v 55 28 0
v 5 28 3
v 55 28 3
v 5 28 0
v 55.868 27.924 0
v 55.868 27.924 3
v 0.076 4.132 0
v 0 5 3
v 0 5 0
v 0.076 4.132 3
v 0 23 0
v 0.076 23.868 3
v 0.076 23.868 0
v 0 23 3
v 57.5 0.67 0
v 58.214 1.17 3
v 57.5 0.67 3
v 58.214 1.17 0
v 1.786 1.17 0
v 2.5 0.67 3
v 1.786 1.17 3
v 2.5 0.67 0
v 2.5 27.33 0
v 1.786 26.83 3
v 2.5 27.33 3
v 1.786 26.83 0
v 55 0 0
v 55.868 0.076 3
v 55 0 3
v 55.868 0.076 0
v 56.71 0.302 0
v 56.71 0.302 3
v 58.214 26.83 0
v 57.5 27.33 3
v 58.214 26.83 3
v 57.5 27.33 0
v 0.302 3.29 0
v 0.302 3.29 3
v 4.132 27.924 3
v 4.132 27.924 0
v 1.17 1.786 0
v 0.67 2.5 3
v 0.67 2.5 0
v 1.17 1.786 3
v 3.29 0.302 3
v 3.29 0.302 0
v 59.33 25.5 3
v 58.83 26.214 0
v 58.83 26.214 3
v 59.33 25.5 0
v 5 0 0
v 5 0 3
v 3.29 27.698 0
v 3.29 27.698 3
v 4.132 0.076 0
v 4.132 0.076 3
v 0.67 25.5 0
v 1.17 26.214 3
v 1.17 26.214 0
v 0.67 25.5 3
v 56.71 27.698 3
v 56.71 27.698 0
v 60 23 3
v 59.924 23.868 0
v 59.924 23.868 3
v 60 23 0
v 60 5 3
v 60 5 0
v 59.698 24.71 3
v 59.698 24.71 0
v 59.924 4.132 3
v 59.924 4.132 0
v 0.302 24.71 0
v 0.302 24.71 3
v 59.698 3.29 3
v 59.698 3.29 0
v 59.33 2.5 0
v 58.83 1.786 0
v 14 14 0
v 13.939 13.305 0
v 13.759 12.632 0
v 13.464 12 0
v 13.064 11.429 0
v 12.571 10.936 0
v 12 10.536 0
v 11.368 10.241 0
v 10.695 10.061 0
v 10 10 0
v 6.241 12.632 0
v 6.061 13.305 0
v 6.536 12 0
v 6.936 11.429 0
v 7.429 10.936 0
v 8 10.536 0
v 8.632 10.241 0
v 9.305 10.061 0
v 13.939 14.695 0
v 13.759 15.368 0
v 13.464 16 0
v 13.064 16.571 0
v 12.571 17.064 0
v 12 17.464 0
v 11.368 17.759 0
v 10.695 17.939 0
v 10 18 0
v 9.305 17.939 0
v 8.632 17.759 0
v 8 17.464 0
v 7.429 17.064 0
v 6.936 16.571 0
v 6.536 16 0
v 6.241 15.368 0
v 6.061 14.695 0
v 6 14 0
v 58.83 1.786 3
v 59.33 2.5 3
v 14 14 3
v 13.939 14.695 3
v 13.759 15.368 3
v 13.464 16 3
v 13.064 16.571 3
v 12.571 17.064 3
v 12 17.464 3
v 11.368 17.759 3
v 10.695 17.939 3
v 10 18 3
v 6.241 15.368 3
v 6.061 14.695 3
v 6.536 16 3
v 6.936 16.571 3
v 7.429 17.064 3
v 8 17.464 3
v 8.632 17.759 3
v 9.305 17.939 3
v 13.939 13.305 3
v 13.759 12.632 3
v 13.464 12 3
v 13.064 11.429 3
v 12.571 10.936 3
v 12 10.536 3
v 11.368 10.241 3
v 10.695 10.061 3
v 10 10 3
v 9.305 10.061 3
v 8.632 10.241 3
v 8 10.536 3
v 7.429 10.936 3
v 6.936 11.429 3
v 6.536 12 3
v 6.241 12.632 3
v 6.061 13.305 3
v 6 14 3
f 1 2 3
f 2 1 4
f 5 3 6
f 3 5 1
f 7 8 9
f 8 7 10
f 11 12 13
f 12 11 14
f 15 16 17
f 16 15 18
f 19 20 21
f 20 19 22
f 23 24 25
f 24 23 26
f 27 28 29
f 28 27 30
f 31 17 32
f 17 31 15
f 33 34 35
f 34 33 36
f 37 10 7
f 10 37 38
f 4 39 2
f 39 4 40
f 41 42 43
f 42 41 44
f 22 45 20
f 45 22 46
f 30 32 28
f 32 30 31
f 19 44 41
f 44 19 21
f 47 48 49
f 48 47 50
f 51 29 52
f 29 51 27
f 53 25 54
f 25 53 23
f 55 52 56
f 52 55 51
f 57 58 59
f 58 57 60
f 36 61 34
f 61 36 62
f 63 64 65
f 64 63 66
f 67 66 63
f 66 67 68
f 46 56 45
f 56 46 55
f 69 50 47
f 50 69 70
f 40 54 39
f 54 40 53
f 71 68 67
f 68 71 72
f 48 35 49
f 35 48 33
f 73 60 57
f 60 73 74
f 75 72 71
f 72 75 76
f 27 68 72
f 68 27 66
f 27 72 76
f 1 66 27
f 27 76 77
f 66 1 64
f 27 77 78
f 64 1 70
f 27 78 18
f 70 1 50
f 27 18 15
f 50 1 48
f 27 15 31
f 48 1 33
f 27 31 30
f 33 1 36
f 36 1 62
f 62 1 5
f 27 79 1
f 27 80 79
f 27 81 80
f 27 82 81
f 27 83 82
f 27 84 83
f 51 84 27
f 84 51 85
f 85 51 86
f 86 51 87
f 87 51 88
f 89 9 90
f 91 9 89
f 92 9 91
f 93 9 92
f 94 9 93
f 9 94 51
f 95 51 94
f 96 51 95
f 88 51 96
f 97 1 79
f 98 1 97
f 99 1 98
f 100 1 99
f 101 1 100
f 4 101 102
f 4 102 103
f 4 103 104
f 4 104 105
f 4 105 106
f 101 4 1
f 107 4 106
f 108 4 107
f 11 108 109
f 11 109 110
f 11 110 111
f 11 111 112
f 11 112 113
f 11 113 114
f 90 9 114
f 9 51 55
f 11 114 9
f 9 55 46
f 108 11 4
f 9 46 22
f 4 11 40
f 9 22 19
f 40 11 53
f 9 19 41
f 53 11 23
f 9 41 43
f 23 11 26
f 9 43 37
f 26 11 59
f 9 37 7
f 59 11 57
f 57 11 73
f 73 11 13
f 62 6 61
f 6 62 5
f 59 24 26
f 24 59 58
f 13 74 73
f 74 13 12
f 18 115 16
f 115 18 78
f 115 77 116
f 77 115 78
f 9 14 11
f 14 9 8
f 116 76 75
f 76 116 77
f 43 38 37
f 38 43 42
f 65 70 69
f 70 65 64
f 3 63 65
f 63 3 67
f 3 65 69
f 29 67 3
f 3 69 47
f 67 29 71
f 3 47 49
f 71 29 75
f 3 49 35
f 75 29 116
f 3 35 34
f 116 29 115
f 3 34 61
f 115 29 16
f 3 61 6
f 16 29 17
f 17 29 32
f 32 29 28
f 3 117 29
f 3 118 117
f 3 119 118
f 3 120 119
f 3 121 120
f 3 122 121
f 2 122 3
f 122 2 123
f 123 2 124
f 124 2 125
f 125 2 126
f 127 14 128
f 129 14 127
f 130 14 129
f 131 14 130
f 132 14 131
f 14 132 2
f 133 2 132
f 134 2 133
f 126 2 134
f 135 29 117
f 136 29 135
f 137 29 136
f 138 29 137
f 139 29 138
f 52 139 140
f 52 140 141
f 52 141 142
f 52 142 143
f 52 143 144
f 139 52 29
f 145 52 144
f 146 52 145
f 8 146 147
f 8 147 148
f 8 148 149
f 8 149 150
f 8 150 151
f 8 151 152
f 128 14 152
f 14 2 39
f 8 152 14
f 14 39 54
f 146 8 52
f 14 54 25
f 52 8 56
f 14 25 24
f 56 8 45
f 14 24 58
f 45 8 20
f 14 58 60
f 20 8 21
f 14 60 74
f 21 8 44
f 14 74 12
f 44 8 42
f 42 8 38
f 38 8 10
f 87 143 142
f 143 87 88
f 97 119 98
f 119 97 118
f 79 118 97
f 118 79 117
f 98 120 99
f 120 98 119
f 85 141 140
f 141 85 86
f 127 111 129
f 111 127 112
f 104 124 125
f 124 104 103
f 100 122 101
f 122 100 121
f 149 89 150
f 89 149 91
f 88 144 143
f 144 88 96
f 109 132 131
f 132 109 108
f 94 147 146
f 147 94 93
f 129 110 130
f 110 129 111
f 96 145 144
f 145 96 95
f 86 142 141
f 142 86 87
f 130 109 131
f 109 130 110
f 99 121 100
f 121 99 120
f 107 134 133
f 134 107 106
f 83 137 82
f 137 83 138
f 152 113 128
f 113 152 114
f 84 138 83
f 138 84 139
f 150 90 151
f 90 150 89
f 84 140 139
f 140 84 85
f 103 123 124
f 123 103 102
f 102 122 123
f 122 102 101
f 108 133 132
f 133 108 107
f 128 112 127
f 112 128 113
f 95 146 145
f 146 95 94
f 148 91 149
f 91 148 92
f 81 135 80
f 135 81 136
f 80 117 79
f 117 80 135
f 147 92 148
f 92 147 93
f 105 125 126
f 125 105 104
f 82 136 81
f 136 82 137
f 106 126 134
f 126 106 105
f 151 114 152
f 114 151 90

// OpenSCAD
// =====================================================================
// LLAVERO PARAMETRICO CON TEXTO 3D — Vorea Studio
// =====================================================================

// [min:40, max:100] Largo del llavero (mm)
largo = 60;

// [min:20, max:50] Ancho del llavero (mm)
ancho = 28;

// [min:2, max:6] Grosor de la base (mm)
grosor = 3;

// [min:3, max:8] Radio de esquinas redondeadas (mm)
r_esq = 5;

// [min:2, max:7] Radio del agujero del arillo (mm)
r_agujero = 4;

// [min:3, max:12] Tamaño del texto (mm)
tam_texto = 7;

// Primera línea de texto
linea1 = "VOREA";

// Segunda línea de texto
linea2 = "STUDIO";

$fn = 36;

// ─── Cuerpo con agujero ───────────────────────────────────────────────
difference() {
    hull() {
        translate([r_esq,           r_esq,           0]) cylinder(r=r_esq, h=grosor);
        translate([largo - r_esq,   r_esq,           0]) cylinder(r=r_esq, h=grosor);
        translate([r_esq,           ancho - r_esq,   0]) cylinder(r=r_esq, h=grosor);
        translate([largo - r_esq,   ancho - r_esq,   0]) cylinder(r=r_esq, h=grosor);
    }
    // Agujero del arillo
    translate([r_esq + r_agujero + 1, ancho / 2, -0.5])
        cylinder(r=r_agujero, h=grosor + 1);
}

// ─── Texto en relieve ────────────────────────────────────────────────
// Centro X del llavero (todo el largo)
x_txt = largo / 2 + 5;
y_txt = ancho / 2;

// Texto justo encima de la superficie (+0.01 evita z-fighting)
translate([x_txt, y_txt + tam_texto * 0.4, grosor + 0.01])
    text(linea1, size=tam_texto, halign="center", valign="center");

translate([x_txt, y_txt - tam_texto * 0.5, grosor + 0.01])
    text(linea2, size=tam_texto * 0.55, halign="center", valign="center");
